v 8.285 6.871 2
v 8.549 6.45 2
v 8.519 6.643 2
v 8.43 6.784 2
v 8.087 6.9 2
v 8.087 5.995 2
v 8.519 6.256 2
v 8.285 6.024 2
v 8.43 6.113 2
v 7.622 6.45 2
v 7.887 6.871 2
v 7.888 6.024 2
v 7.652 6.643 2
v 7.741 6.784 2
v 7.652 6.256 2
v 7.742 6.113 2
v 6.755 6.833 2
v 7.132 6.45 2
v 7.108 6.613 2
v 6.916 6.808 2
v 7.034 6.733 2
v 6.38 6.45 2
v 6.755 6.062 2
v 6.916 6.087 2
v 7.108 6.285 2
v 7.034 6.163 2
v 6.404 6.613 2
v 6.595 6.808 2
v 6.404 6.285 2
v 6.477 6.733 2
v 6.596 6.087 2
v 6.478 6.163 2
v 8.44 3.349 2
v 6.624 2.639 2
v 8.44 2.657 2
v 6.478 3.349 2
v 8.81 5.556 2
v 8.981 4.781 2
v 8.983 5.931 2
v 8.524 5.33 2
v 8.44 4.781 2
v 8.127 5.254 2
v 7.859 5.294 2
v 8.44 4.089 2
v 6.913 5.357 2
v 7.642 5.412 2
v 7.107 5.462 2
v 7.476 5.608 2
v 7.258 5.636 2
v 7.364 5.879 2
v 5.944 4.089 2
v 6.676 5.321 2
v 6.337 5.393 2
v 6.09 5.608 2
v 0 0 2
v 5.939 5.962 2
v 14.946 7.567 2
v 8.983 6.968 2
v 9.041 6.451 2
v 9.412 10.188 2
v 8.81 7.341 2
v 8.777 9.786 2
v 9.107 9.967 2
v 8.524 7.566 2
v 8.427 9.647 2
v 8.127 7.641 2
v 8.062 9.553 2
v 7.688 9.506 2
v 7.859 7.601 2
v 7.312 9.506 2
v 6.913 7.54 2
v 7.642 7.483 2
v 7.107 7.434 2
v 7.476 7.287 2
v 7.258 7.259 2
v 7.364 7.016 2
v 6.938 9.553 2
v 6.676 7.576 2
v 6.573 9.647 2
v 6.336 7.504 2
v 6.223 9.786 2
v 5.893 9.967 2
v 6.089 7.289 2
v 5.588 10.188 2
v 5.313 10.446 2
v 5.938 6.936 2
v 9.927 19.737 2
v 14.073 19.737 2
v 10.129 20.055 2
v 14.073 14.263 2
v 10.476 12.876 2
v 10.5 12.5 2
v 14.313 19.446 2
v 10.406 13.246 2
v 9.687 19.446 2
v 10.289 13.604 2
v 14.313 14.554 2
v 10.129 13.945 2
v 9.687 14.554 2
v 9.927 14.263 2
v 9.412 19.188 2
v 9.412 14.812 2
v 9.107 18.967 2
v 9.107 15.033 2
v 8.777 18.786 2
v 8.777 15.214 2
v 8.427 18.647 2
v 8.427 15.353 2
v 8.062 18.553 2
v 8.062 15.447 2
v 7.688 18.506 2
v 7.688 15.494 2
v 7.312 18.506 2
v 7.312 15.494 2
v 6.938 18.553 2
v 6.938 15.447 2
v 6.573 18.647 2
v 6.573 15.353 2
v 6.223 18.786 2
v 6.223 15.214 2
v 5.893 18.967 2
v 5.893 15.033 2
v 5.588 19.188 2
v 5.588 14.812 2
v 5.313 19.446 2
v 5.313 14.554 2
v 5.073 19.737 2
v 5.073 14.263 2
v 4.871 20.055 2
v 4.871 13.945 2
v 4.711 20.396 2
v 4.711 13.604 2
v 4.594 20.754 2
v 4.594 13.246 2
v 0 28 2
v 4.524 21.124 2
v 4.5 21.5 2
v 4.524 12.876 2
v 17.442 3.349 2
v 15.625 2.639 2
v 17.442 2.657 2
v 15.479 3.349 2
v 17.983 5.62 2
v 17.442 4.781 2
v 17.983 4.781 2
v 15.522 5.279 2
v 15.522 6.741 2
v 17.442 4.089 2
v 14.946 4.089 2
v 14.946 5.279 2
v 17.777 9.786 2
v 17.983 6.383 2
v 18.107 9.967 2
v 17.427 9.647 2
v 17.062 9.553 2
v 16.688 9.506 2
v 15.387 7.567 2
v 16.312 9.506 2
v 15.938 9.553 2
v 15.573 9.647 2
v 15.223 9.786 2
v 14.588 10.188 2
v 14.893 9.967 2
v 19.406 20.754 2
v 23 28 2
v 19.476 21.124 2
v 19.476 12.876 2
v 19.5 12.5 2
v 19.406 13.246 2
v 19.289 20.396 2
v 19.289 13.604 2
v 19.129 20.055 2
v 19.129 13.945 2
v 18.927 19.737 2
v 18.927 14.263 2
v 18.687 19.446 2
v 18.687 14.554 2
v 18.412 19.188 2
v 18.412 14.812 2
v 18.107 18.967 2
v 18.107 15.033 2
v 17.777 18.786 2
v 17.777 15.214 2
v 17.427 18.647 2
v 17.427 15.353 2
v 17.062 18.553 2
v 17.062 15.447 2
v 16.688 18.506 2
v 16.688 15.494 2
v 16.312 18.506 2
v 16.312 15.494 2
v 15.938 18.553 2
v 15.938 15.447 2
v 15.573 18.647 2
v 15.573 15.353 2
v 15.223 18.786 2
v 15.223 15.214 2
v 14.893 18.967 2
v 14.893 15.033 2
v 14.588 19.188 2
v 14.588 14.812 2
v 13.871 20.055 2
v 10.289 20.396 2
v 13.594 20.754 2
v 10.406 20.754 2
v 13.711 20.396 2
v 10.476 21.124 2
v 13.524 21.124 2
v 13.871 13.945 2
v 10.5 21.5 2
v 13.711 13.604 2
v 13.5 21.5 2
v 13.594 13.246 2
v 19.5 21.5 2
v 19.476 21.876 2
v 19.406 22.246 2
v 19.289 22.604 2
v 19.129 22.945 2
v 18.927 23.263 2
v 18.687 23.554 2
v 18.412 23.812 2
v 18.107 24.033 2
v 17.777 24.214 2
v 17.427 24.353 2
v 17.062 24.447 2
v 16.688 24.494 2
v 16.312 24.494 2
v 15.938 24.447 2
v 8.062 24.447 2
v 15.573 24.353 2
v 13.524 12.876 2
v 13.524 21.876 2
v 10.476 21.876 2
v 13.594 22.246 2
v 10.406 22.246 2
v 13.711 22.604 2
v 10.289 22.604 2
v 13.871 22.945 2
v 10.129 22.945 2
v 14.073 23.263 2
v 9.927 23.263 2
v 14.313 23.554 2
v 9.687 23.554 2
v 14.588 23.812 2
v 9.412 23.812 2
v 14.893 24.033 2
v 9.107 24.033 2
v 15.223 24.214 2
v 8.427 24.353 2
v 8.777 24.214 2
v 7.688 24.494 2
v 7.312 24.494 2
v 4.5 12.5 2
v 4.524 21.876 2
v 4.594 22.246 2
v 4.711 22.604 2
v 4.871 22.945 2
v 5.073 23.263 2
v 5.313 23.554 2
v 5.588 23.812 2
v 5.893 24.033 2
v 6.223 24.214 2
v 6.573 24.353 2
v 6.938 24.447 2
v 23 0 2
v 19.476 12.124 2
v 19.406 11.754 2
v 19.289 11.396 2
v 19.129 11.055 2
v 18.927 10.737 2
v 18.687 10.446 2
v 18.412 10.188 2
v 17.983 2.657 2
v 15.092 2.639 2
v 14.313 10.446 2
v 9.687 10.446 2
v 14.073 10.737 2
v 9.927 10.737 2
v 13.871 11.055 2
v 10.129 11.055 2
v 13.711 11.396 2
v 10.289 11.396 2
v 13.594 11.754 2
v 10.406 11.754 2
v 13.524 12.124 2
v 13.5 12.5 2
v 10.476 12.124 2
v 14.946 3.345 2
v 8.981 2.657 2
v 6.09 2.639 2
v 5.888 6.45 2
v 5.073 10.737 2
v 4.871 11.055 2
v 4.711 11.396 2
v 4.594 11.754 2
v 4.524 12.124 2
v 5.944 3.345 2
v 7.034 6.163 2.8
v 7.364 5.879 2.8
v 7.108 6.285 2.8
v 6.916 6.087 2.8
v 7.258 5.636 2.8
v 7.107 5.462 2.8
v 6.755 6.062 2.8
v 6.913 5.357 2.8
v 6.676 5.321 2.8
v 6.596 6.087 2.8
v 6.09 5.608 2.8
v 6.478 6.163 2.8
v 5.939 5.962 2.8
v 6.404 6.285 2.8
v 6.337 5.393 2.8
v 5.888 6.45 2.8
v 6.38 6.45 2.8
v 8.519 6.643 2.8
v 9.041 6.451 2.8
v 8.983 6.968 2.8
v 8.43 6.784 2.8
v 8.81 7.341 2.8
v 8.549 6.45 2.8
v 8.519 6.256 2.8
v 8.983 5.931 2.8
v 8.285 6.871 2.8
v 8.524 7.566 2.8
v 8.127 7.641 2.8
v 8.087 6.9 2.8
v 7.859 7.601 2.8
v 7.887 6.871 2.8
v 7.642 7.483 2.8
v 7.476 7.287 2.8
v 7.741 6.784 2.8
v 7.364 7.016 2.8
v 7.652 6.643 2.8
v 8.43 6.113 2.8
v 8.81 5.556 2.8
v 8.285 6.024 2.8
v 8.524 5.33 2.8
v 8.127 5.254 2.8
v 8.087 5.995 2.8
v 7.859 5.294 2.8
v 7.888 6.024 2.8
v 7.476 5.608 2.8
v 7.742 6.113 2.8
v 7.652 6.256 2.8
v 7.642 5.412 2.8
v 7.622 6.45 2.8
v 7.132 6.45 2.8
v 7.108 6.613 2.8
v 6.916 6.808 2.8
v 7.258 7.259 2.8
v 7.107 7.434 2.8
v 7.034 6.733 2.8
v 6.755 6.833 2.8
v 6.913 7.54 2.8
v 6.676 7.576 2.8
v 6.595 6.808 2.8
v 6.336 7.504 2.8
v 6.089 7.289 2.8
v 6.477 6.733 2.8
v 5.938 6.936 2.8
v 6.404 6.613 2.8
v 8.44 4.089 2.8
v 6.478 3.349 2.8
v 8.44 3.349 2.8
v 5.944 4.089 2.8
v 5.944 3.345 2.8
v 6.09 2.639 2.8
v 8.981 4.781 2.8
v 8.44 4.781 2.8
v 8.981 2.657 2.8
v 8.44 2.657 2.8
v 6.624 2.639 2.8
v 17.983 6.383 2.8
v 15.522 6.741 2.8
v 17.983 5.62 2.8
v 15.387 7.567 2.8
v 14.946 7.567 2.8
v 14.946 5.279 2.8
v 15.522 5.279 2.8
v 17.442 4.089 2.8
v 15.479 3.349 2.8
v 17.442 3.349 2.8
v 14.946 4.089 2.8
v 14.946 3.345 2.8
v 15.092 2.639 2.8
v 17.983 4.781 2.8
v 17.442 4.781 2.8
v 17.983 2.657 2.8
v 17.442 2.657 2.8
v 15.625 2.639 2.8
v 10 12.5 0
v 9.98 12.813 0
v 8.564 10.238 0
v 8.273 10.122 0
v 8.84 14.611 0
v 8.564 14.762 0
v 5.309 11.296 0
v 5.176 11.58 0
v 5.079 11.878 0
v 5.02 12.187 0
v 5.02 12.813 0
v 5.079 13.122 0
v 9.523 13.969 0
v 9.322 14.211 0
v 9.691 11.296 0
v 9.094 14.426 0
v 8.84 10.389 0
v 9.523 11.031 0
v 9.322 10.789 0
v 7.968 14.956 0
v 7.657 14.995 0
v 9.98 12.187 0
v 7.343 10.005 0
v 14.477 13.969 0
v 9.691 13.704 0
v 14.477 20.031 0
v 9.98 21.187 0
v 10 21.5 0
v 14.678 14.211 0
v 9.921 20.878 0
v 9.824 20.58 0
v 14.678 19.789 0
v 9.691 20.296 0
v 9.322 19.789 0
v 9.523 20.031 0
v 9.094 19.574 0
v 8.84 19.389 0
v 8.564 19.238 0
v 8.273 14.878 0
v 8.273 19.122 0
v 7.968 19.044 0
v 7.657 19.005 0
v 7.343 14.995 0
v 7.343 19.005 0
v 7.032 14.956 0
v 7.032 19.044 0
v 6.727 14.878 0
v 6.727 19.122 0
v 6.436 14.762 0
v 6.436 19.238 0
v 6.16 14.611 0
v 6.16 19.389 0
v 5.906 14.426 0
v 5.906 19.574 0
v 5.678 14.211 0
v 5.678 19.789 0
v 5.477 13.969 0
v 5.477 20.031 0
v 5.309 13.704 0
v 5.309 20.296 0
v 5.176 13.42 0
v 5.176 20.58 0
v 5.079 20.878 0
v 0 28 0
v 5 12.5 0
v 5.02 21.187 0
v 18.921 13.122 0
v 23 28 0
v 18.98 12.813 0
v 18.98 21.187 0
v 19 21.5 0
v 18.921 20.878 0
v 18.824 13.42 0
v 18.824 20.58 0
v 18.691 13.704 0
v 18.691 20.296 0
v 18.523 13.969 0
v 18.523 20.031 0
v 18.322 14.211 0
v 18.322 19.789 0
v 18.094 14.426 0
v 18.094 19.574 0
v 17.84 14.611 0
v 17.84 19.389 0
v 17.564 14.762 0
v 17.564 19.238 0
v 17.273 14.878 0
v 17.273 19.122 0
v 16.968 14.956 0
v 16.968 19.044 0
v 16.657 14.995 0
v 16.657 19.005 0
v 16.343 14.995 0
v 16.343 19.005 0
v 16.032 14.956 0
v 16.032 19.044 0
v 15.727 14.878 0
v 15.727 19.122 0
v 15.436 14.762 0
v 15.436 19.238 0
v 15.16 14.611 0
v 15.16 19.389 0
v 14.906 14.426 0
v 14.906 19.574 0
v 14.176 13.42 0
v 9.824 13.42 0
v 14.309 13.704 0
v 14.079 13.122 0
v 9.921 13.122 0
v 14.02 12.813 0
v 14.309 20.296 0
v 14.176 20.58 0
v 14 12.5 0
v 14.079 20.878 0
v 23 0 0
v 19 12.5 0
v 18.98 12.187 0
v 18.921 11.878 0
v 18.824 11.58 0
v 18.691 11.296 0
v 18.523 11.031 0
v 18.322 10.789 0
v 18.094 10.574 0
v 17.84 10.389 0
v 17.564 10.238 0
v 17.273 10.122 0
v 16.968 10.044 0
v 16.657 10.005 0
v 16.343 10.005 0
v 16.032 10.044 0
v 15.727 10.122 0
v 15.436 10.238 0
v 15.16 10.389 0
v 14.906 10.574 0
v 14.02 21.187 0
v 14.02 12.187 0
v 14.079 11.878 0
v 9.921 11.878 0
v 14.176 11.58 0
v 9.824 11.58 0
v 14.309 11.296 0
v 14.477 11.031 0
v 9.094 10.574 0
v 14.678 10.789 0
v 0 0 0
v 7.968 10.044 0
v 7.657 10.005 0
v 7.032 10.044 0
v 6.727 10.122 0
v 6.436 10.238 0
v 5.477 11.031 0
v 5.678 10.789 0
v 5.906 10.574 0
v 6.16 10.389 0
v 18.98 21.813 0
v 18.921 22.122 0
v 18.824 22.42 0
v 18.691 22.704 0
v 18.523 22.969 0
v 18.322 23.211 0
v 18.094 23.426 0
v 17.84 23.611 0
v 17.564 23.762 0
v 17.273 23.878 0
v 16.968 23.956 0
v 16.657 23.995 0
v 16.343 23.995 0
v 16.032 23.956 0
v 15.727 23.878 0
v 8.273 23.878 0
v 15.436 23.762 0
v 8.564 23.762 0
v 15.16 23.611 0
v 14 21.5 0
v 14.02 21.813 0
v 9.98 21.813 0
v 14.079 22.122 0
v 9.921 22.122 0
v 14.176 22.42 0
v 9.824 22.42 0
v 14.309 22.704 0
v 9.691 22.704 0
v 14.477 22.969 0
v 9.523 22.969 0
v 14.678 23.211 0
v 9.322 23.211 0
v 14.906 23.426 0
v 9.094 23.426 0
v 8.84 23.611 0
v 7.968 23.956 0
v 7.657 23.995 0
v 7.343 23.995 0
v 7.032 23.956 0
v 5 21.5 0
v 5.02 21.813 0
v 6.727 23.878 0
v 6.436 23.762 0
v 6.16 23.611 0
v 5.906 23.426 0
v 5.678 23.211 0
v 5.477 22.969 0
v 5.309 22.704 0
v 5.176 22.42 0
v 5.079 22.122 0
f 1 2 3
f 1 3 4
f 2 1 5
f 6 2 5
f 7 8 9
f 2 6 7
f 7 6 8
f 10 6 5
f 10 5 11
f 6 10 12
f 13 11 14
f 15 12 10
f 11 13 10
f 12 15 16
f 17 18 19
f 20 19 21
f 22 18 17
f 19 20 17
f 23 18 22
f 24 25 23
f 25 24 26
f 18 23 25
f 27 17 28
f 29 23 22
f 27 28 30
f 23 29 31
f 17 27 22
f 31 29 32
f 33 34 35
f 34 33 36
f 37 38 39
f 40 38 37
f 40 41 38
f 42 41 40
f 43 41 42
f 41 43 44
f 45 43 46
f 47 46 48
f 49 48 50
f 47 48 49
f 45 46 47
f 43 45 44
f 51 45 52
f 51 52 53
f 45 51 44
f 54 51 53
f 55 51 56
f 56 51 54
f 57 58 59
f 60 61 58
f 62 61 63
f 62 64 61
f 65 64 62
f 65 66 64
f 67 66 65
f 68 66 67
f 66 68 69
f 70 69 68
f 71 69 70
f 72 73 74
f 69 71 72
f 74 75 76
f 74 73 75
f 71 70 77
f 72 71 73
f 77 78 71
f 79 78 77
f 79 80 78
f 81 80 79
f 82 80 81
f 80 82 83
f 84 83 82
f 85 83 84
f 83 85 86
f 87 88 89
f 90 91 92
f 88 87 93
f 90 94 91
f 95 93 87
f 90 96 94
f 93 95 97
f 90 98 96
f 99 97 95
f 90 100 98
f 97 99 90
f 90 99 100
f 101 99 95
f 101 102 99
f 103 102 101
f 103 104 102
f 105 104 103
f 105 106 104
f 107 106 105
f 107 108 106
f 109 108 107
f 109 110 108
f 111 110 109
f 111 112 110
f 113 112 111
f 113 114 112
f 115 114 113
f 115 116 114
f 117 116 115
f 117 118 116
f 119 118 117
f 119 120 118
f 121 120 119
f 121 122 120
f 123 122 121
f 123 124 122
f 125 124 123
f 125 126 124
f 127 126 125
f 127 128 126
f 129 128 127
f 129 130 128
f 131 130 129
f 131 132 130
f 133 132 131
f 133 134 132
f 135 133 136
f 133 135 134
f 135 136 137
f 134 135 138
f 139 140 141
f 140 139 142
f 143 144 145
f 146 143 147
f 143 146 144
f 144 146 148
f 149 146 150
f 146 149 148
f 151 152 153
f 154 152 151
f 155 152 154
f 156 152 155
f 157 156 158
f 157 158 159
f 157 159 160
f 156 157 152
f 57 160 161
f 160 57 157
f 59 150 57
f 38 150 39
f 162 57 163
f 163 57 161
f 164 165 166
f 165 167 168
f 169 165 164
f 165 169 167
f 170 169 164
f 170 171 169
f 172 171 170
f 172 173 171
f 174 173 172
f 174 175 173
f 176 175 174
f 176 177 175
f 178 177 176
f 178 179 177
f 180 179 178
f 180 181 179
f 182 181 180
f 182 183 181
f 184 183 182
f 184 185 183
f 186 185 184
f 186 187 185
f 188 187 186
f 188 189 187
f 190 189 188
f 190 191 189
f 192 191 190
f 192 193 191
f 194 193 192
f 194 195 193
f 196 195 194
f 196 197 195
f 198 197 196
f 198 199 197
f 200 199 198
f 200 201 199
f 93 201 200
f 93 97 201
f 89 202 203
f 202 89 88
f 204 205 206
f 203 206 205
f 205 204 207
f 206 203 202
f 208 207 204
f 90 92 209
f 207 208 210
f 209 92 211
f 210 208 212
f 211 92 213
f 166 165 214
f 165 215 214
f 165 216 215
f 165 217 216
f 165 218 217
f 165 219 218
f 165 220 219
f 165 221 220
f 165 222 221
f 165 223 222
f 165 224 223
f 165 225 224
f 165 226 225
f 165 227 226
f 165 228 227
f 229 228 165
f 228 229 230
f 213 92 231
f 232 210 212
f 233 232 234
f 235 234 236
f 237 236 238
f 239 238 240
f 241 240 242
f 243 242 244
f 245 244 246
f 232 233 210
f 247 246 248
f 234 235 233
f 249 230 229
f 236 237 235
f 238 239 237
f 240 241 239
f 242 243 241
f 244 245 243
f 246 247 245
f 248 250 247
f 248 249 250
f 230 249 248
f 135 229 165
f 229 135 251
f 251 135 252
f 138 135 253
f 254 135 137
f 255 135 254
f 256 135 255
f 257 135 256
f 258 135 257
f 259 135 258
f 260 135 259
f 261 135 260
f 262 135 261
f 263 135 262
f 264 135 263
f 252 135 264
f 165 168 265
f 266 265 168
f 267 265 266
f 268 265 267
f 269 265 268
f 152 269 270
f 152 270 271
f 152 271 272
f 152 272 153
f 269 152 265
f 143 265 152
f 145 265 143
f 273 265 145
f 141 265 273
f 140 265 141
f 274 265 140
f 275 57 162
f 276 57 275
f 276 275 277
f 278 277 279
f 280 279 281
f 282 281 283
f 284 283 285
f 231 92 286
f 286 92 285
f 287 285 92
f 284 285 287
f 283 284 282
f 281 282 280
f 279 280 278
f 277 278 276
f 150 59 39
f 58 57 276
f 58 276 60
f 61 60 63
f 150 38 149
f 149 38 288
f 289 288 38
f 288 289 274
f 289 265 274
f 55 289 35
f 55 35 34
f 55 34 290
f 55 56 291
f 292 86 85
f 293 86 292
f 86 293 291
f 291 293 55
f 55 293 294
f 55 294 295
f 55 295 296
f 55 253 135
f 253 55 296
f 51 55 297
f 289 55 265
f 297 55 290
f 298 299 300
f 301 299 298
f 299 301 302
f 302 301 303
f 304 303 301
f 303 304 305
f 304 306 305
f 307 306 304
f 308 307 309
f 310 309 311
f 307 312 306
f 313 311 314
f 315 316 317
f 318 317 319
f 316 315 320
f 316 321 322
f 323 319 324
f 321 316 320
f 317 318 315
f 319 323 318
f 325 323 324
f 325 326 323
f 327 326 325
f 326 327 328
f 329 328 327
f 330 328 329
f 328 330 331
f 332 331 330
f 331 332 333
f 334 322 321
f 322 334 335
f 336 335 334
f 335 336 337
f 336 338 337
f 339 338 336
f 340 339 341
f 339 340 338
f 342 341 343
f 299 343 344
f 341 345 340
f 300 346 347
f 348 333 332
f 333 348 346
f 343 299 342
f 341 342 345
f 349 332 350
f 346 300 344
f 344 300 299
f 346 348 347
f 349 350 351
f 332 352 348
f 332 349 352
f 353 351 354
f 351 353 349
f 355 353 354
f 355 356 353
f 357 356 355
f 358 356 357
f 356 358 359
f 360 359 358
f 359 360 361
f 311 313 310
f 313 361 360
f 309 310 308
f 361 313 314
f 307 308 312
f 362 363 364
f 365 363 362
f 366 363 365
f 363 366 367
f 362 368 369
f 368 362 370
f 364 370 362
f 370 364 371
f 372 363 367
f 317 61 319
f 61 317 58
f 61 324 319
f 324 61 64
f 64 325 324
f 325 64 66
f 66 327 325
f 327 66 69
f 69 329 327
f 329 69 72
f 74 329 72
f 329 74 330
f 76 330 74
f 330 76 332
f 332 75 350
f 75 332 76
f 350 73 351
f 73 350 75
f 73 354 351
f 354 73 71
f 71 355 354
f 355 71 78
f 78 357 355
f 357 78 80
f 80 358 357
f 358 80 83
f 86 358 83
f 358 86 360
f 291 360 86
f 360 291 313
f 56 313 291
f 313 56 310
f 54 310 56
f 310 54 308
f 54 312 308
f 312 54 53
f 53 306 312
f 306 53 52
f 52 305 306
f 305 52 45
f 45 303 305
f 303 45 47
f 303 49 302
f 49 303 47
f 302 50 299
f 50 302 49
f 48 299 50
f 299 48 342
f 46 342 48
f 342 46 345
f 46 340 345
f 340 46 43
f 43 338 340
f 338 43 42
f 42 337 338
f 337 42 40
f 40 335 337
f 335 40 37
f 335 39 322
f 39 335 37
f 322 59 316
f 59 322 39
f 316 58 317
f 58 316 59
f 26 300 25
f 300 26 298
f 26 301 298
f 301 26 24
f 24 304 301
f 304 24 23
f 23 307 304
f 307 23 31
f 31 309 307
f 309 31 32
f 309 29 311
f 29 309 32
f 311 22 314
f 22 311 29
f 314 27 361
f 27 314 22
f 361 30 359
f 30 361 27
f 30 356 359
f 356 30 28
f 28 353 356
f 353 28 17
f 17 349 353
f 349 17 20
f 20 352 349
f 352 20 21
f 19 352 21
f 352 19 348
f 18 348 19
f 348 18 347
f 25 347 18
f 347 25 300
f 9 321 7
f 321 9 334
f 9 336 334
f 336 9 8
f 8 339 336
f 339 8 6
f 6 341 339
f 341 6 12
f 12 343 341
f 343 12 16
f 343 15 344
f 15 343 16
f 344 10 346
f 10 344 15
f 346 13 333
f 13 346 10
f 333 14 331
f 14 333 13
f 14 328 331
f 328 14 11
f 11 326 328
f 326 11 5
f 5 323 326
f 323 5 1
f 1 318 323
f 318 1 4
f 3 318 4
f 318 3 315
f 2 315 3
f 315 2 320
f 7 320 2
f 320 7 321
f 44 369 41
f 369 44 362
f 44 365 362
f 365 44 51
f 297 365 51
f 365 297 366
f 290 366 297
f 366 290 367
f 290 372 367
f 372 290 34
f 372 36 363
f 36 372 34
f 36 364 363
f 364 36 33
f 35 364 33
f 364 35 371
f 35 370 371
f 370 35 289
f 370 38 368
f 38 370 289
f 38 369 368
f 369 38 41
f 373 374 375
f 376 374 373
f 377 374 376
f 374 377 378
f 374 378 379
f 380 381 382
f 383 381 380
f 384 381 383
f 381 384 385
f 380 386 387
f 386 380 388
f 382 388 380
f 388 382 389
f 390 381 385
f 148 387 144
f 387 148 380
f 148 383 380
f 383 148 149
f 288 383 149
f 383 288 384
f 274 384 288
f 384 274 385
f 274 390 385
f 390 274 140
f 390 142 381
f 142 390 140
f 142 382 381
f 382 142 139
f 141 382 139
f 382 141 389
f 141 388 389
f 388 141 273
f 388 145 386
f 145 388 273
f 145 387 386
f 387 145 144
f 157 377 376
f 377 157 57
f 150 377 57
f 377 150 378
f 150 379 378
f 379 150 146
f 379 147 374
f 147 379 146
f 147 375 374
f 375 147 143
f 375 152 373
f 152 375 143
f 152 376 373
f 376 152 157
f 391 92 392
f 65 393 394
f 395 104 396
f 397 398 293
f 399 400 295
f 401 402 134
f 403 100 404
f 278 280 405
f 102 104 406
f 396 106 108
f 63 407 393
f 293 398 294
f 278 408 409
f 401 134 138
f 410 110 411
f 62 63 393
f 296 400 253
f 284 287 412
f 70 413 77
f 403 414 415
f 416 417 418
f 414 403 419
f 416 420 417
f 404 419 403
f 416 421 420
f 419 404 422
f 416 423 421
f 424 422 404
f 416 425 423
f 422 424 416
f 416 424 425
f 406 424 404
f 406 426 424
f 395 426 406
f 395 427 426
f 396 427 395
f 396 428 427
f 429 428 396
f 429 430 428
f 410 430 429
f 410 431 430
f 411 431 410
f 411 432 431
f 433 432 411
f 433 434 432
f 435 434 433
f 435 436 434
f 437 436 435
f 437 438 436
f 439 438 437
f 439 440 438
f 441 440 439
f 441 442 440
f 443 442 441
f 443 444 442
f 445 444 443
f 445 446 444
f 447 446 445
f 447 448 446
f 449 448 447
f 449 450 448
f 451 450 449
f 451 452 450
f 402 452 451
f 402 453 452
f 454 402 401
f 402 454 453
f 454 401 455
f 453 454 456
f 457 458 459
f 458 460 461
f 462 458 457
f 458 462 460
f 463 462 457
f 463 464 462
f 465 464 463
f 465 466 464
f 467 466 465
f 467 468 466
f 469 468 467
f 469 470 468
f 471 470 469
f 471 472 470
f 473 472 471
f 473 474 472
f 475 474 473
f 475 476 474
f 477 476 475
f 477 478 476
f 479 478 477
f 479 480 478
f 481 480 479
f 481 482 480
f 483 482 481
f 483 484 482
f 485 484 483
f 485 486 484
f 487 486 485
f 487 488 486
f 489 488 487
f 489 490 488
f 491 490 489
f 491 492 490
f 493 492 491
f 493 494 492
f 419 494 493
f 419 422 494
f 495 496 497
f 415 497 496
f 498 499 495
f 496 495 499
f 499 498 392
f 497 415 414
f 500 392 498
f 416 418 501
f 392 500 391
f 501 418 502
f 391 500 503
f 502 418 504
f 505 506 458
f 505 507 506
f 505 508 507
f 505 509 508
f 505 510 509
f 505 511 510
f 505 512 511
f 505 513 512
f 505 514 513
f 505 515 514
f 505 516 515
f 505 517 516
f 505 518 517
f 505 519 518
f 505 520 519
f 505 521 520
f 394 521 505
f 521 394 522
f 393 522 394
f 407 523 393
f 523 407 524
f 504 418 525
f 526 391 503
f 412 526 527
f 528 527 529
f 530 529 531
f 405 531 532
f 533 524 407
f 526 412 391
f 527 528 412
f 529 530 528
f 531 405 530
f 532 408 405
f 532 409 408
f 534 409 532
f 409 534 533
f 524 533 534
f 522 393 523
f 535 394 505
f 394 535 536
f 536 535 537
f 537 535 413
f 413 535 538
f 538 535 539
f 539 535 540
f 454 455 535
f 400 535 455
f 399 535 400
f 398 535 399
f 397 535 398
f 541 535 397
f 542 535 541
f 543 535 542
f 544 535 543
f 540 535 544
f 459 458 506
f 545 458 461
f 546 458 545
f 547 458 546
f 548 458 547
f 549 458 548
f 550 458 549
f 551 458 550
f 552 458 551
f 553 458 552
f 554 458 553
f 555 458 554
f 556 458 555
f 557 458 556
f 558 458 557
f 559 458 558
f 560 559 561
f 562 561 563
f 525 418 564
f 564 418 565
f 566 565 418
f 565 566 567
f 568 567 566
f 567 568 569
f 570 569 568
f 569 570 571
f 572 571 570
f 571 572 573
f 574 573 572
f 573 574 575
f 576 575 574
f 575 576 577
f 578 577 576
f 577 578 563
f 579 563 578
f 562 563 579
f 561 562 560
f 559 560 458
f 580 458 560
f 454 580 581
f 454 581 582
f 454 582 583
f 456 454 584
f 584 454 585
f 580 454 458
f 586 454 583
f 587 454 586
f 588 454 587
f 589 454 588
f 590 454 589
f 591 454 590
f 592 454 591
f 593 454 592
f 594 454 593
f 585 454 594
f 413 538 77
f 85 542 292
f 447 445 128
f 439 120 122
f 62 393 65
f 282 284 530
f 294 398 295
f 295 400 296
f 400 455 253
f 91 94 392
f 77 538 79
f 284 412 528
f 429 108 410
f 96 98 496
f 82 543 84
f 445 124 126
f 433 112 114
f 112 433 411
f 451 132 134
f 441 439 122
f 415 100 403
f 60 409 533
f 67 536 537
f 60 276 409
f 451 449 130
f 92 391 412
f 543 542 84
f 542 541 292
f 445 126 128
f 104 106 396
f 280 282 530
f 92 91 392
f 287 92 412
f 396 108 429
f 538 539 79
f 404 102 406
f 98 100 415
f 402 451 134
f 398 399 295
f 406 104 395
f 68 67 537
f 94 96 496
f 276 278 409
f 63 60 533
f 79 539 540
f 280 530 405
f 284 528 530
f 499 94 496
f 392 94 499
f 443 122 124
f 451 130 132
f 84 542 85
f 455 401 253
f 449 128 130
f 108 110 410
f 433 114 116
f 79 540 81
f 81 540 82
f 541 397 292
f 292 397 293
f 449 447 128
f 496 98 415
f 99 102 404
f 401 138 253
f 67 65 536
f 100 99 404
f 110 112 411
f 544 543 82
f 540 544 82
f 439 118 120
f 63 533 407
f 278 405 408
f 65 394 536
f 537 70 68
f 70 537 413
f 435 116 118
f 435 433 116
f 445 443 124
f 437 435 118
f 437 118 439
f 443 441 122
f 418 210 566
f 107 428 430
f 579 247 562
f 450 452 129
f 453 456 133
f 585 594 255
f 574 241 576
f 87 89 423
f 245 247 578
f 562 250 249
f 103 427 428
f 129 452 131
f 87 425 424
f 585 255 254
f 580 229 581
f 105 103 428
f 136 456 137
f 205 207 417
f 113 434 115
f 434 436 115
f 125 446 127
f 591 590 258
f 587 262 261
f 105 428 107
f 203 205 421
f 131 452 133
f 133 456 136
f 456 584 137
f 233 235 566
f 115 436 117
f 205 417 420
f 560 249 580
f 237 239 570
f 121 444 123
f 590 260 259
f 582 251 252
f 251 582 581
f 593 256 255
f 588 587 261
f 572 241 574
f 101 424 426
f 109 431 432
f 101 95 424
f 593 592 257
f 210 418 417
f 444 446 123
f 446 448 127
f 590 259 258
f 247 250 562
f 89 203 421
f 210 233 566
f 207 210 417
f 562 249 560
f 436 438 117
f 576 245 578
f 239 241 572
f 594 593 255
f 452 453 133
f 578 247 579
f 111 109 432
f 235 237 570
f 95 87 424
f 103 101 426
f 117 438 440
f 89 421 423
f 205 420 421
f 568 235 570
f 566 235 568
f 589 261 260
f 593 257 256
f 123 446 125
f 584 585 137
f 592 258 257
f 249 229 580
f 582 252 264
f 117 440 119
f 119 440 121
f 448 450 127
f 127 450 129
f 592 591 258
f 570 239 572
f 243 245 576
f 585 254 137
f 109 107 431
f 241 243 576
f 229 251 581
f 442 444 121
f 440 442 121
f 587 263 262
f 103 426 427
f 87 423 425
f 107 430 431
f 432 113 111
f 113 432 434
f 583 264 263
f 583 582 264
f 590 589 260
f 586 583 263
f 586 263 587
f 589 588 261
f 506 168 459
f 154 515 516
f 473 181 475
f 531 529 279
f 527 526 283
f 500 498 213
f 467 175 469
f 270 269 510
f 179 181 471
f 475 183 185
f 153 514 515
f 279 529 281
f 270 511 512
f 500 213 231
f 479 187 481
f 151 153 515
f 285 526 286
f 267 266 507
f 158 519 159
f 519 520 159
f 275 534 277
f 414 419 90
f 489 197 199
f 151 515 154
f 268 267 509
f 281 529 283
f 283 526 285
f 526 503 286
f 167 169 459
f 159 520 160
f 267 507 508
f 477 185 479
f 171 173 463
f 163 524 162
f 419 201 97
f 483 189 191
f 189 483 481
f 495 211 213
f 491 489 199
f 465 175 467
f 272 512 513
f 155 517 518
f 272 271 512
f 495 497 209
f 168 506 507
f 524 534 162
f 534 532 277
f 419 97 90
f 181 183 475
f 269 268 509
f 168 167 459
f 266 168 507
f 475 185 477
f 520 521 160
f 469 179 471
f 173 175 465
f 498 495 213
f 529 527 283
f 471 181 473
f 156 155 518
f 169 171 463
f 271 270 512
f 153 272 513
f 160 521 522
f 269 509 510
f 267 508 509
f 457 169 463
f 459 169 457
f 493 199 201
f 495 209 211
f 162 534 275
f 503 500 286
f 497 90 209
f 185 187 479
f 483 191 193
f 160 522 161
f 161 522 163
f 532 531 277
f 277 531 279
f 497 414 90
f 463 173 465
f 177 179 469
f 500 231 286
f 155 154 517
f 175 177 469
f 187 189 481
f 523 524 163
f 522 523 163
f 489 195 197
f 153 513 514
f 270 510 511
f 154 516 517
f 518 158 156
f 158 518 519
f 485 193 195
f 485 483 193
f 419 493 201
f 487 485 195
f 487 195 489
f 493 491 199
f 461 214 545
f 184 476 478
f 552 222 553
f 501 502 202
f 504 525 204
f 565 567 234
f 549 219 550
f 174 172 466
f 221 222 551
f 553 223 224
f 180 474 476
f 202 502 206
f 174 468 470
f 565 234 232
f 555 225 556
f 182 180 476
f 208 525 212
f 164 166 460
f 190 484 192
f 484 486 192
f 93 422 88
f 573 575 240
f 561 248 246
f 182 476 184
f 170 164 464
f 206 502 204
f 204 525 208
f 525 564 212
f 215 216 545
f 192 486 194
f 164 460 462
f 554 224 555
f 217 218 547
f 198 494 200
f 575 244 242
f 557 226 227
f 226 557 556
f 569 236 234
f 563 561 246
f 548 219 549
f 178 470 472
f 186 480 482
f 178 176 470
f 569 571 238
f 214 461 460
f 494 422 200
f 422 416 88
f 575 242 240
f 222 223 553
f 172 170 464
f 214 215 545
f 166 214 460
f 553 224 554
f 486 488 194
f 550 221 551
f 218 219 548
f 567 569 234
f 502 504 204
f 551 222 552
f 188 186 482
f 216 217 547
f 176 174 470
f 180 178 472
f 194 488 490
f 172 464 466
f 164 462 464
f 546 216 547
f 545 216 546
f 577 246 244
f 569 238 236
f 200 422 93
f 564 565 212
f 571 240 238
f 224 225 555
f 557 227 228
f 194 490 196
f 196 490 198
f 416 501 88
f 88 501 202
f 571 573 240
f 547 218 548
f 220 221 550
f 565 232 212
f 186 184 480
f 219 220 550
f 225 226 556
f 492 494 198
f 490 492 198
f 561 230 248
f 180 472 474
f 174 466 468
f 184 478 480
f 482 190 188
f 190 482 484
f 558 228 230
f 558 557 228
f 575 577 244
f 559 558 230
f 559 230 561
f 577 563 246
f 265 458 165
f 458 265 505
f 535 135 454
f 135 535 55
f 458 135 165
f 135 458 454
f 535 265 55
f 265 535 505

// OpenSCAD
echo(version=version());

circleD = 6;
circleDSmall = 5;
circleGap = 3;

bevelDepth = 1;

baseDepth = 2;

baseMargin = 4;

cols = 2;
rows = 2;

// cols = 1;
// rows = 1;

extraTextAreaWidth = 5;

textDepth = 0.8;

baseLength = rows * circleD + (rows - 1) * circleGap + 2 * baseMargin;
baseWidth = cols * circleD + (cols - 1) * circleGap + 2 * baseMargin + extraTextAreaWidth;

echo("base width");
echo(baseWidth);
echo("base length");
echo(baseLength);

module hole() {
    translate([
        (circleGap + circleD) / 2,
        (circleGap + circleD) / 2,
    ])
    color("red")
    // cylinder(h=baseDepth,d=circleD, $fn=50);
    // translate([0,0,baseDepth])
    cylinder(baseDepth, d1=circleDSmall, d2=circleD, $fn=50);
}

module holes() {
    for ( j = [0 : rows - 1] ){
        for ( i = [0 : cols - 1] ){
            translate([
                (circleGap + circleD) * j + circleD / 2,
                (circleGap + circleD) * i + circleD / 2 + extraTextAreaWidth,
            ])
            // difference() {
            //     cube([circleD + circleGap, circleD + circleGap, baseDepth]);
                hole();
            // }
        }
    }
}

module holeNumbers() {
     for ( j = [0 : rows - 1] ){ 
        translate([
            (circleGap + circleD) * j + circleD / 2 + baseMargin + 0.5,
            5,
            baseDepth
        ])
        rotate([0, 0, 90])
        linear_extrude(textDepth)
        text(
            str(rows - j + 16),
            font="tahoma:style=Bold",
            size = 3,
            halign= "center",
            valign="center"
        );
    }
}

module cutOut() {
    translate([(baseLength / 2) - 10,0,0]) {
        cube([baseLength, baseWidth, baseDepth * 2]);
    }
}

holeNumbers();

difference() {
    cube([baseLength, baseWidth, baseDepth]);
    holes();
}
